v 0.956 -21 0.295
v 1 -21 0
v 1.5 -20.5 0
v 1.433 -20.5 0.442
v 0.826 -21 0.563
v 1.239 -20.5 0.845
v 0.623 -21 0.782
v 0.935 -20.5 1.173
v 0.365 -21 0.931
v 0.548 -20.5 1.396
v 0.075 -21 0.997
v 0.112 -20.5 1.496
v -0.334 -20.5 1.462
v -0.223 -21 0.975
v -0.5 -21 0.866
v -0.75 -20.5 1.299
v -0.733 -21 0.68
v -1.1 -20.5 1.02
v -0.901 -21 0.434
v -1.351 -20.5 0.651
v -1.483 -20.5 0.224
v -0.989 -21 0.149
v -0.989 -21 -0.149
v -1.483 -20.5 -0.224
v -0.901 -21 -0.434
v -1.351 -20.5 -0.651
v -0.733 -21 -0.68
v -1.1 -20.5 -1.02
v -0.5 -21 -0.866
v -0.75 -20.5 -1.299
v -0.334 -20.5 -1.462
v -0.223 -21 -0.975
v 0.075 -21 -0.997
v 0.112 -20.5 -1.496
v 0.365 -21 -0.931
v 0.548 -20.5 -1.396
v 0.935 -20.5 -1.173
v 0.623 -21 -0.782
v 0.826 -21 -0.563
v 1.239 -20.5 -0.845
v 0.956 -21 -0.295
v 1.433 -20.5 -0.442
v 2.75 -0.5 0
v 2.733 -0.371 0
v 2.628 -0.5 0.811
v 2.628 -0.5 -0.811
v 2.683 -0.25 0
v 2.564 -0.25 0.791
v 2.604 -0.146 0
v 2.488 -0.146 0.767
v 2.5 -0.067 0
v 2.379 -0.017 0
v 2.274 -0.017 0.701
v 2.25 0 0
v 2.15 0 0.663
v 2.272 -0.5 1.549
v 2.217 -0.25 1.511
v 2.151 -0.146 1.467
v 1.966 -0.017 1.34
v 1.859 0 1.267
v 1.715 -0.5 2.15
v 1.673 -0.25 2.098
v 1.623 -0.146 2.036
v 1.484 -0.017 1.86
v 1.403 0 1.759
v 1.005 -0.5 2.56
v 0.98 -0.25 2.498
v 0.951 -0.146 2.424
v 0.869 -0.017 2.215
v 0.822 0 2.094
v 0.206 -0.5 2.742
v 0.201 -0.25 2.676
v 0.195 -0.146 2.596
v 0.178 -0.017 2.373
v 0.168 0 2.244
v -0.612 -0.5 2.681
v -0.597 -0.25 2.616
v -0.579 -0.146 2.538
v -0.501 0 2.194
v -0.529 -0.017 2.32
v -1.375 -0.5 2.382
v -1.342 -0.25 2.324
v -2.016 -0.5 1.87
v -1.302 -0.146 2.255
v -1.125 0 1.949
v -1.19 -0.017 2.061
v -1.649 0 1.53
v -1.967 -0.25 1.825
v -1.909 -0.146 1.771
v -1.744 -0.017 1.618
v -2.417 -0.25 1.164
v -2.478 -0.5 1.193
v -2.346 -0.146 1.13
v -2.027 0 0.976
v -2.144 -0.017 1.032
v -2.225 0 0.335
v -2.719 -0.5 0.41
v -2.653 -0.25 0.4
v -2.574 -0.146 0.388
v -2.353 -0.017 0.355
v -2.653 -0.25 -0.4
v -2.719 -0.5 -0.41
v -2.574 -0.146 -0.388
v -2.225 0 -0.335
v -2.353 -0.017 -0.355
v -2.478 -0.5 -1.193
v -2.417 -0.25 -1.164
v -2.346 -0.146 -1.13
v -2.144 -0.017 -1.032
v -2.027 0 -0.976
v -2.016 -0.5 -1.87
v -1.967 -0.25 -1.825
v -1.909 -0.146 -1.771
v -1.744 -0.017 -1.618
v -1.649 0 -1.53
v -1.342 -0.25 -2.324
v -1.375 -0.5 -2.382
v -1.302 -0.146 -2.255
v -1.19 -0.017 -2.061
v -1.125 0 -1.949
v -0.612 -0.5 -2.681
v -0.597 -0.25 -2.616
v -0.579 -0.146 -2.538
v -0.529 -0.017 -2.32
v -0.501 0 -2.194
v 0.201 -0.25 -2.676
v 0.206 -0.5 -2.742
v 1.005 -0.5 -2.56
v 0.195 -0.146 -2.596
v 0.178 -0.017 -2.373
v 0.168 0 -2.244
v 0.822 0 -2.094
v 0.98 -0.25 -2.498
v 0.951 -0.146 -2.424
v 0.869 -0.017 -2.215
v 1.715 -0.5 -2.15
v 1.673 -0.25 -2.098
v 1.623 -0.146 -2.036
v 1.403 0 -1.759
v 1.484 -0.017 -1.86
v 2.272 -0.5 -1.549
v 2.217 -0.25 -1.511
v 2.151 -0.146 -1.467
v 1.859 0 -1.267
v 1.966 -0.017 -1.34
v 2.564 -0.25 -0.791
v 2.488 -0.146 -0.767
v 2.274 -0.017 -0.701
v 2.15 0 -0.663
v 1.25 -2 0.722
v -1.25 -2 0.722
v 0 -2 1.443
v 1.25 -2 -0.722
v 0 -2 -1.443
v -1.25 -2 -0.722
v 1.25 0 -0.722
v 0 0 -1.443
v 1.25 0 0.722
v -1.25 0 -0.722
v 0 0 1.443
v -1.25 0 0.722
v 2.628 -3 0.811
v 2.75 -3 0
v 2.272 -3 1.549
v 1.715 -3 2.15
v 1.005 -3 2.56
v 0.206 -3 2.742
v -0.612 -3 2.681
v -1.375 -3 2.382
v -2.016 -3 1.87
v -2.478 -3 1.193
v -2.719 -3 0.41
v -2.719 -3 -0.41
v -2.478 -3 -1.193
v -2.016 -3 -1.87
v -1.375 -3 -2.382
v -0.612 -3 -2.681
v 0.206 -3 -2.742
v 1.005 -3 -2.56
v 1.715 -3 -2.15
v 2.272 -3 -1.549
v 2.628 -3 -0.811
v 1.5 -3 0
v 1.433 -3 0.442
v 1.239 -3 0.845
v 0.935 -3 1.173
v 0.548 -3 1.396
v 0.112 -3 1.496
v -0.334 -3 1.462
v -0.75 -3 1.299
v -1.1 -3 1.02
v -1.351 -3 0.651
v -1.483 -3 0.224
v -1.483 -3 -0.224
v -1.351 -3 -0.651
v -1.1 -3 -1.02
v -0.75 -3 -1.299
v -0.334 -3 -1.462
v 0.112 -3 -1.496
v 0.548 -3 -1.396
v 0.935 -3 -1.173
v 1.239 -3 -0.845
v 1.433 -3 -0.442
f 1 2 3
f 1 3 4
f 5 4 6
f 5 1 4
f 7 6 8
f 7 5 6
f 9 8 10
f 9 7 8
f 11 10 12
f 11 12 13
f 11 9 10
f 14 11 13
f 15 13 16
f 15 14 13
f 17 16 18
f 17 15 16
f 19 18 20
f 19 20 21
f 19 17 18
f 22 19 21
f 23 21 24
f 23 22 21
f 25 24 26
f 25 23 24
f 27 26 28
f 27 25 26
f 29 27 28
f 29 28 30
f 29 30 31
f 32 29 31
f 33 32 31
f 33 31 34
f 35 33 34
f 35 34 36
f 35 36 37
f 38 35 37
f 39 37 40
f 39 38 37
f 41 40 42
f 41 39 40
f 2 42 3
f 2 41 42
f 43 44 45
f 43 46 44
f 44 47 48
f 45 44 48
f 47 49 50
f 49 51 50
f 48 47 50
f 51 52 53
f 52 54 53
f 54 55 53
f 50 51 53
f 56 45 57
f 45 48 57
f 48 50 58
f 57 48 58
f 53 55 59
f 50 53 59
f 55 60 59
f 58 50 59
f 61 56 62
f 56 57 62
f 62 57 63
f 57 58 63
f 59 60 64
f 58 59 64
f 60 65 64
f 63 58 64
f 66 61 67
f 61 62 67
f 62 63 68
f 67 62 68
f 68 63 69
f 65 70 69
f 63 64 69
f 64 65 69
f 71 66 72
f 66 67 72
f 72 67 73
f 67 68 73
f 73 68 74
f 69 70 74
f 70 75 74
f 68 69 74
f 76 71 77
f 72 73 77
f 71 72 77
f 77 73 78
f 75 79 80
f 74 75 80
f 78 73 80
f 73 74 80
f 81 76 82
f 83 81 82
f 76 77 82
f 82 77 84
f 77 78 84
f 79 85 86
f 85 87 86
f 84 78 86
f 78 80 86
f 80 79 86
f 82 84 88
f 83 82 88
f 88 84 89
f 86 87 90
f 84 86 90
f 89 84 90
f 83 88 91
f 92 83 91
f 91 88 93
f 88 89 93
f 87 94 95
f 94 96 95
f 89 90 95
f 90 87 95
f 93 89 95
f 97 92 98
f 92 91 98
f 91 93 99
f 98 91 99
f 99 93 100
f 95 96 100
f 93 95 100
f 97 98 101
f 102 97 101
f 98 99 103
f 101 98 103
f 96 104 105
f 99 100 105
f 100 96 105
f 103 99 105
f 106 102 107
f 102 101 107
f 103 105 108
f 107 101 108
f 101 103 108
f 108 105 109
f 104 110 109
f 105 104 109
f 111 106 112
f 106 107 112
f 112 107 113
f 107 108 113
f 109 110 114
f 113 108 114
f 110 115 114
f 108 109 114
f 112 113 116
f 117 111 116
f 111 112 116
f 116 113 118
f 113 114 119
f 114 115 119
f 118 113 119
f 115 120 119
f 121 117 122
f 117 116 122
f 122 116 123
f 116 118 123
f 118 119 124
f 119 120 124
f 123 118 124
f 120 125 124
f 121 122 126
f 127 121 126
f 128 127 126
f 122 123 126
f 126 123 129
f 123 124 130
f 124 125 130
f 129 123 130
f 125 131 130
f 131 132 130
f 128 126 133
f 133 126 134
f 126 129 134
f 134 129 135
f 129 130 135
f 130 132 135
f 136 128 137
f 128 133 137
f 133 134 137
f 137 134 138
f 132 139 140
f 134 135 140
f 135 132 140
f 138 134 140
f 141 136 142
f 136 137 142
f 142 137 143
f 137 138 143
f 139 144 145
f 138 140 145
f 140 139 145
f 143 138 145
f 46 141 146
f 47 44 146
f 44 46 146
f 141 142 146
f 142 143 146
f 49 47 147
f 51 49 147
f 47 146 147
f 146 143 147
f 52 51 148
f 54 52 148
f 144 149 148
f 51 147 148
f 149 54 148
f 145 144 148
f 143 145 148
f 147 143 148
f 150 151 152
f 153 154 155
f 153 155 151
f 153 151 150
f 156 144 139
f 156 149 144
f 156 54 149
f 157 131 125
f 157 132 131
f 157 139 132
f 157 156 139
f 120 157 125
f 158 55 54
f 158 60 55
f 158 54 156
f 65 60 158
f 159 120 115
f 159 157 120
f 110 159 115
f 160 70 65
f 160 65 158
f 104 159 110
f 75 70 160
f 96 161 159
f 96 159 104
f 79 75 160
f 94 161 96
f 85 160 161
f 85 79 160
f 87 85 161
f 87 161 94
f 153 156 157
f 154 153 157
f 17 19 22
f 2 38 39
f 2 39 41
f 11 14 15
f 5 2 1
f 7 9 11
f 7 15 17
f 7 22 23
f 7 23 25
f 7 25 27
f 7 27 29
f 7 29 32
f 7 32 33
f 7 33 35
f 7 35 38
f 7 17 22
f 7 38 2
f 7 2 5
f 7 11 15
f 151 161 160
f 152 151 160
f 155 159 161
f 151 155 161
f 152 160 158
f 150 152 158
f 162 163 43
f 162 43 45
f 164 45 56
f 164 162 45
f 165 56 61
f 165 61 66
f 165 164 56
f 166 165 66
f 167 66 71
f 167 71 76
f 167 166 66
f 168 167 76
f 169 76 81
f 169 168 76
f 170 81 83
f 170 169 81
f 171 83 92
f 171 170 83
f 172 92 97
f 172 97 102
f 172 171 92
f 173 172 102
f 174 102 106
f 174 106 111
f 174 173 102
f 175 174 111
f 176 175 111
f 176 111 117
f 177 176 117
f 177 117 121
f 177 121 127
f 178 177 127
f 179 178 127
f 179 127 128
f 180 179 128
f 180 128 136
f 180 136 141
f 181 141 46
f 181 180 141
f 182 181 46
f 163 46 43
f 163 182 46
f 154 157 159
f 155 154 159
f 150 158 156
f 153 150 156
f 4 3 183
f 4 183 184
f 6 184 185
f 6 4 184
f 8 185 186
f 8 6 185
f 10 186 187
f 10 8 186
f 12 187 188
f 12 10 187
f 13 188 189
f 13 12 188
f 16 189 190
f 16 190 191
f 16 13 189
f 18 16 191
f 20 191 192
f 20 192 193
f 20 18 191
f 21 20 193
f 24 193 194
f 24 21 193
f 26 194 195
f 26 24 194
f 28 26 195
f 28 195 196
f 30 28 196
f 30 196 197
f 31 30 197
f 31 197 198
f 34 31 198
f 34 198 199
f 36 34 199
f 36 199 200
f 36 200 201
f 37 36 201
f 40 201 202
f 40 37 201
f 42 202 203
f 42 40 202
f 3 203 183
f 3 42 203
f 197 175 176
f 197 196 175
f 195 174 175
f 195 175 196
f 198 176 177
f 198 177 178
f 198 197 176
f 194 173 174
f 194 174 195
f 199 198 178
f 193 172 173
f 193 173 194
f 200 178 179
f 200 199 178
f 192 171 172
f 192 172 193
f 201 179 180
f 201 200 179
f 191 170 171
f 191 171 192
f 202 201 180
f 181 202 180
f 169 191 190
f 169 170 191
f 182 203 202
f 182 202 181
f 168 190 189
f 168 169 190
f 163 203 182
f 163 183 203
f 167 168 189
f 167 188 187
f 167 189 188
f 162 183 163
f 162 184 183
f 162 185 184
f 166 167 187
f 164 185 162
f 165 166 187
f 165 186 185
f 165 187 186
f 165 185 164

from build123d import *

# Parameters (mm, degrees)
CORTAR_EXTRUIR1_DEPTH = 2
CHAFL_N1_SIZE         = 0.5
REDONDEO1_R           = 0.5


with BuildPart() as part:
    # Croquis1 → Revolución1 (revolve)
    with BuildSketch(Plane.XY):
        Polygon((0, 0), (2.75, 0), (2.75, -3), (1.5, -3), (1.5, -21), (0, -21), align=None)
    revolve(axis=Axis((0, 0, 0), (0, -1, 0)))

    # Croquis2 → Cortar-Extruir1 (cut)
    with BuildSketch(Plane(origin=(0, 0, 0), x_dir=(1, 0, 0), z_dir=(0, 1, 0))):
        Polygon((1.25, 0.721687836), (0, 1.443375673), (-1.25, 0.721687836), (-1.25, -0.721687836), (0, -1.443375673), (1.25, -0.721687836), align=None)
    extrude(amount=-CORTAR_EXTRUIR1_DEPTH, mode=Mode.SUBTRACT)

    # Chaflán1
    chafl_n1_edges = [part.edges().sort_by_distance(p)[0] for p in [
        (-1.5, -21, 0),
    ]]
    chamfer(chafl_n1_edges, length=CHAFL_N1_SIZE)

    # Redondeo1
    redondeo1_edges = [part.edges().sort_by_distance(p)[0] for p in [
        (-2.75, 0, 0),
    ]]
    fillet(redondeo1_edges, radius=REDONDEO1_R)


solid = part.part
